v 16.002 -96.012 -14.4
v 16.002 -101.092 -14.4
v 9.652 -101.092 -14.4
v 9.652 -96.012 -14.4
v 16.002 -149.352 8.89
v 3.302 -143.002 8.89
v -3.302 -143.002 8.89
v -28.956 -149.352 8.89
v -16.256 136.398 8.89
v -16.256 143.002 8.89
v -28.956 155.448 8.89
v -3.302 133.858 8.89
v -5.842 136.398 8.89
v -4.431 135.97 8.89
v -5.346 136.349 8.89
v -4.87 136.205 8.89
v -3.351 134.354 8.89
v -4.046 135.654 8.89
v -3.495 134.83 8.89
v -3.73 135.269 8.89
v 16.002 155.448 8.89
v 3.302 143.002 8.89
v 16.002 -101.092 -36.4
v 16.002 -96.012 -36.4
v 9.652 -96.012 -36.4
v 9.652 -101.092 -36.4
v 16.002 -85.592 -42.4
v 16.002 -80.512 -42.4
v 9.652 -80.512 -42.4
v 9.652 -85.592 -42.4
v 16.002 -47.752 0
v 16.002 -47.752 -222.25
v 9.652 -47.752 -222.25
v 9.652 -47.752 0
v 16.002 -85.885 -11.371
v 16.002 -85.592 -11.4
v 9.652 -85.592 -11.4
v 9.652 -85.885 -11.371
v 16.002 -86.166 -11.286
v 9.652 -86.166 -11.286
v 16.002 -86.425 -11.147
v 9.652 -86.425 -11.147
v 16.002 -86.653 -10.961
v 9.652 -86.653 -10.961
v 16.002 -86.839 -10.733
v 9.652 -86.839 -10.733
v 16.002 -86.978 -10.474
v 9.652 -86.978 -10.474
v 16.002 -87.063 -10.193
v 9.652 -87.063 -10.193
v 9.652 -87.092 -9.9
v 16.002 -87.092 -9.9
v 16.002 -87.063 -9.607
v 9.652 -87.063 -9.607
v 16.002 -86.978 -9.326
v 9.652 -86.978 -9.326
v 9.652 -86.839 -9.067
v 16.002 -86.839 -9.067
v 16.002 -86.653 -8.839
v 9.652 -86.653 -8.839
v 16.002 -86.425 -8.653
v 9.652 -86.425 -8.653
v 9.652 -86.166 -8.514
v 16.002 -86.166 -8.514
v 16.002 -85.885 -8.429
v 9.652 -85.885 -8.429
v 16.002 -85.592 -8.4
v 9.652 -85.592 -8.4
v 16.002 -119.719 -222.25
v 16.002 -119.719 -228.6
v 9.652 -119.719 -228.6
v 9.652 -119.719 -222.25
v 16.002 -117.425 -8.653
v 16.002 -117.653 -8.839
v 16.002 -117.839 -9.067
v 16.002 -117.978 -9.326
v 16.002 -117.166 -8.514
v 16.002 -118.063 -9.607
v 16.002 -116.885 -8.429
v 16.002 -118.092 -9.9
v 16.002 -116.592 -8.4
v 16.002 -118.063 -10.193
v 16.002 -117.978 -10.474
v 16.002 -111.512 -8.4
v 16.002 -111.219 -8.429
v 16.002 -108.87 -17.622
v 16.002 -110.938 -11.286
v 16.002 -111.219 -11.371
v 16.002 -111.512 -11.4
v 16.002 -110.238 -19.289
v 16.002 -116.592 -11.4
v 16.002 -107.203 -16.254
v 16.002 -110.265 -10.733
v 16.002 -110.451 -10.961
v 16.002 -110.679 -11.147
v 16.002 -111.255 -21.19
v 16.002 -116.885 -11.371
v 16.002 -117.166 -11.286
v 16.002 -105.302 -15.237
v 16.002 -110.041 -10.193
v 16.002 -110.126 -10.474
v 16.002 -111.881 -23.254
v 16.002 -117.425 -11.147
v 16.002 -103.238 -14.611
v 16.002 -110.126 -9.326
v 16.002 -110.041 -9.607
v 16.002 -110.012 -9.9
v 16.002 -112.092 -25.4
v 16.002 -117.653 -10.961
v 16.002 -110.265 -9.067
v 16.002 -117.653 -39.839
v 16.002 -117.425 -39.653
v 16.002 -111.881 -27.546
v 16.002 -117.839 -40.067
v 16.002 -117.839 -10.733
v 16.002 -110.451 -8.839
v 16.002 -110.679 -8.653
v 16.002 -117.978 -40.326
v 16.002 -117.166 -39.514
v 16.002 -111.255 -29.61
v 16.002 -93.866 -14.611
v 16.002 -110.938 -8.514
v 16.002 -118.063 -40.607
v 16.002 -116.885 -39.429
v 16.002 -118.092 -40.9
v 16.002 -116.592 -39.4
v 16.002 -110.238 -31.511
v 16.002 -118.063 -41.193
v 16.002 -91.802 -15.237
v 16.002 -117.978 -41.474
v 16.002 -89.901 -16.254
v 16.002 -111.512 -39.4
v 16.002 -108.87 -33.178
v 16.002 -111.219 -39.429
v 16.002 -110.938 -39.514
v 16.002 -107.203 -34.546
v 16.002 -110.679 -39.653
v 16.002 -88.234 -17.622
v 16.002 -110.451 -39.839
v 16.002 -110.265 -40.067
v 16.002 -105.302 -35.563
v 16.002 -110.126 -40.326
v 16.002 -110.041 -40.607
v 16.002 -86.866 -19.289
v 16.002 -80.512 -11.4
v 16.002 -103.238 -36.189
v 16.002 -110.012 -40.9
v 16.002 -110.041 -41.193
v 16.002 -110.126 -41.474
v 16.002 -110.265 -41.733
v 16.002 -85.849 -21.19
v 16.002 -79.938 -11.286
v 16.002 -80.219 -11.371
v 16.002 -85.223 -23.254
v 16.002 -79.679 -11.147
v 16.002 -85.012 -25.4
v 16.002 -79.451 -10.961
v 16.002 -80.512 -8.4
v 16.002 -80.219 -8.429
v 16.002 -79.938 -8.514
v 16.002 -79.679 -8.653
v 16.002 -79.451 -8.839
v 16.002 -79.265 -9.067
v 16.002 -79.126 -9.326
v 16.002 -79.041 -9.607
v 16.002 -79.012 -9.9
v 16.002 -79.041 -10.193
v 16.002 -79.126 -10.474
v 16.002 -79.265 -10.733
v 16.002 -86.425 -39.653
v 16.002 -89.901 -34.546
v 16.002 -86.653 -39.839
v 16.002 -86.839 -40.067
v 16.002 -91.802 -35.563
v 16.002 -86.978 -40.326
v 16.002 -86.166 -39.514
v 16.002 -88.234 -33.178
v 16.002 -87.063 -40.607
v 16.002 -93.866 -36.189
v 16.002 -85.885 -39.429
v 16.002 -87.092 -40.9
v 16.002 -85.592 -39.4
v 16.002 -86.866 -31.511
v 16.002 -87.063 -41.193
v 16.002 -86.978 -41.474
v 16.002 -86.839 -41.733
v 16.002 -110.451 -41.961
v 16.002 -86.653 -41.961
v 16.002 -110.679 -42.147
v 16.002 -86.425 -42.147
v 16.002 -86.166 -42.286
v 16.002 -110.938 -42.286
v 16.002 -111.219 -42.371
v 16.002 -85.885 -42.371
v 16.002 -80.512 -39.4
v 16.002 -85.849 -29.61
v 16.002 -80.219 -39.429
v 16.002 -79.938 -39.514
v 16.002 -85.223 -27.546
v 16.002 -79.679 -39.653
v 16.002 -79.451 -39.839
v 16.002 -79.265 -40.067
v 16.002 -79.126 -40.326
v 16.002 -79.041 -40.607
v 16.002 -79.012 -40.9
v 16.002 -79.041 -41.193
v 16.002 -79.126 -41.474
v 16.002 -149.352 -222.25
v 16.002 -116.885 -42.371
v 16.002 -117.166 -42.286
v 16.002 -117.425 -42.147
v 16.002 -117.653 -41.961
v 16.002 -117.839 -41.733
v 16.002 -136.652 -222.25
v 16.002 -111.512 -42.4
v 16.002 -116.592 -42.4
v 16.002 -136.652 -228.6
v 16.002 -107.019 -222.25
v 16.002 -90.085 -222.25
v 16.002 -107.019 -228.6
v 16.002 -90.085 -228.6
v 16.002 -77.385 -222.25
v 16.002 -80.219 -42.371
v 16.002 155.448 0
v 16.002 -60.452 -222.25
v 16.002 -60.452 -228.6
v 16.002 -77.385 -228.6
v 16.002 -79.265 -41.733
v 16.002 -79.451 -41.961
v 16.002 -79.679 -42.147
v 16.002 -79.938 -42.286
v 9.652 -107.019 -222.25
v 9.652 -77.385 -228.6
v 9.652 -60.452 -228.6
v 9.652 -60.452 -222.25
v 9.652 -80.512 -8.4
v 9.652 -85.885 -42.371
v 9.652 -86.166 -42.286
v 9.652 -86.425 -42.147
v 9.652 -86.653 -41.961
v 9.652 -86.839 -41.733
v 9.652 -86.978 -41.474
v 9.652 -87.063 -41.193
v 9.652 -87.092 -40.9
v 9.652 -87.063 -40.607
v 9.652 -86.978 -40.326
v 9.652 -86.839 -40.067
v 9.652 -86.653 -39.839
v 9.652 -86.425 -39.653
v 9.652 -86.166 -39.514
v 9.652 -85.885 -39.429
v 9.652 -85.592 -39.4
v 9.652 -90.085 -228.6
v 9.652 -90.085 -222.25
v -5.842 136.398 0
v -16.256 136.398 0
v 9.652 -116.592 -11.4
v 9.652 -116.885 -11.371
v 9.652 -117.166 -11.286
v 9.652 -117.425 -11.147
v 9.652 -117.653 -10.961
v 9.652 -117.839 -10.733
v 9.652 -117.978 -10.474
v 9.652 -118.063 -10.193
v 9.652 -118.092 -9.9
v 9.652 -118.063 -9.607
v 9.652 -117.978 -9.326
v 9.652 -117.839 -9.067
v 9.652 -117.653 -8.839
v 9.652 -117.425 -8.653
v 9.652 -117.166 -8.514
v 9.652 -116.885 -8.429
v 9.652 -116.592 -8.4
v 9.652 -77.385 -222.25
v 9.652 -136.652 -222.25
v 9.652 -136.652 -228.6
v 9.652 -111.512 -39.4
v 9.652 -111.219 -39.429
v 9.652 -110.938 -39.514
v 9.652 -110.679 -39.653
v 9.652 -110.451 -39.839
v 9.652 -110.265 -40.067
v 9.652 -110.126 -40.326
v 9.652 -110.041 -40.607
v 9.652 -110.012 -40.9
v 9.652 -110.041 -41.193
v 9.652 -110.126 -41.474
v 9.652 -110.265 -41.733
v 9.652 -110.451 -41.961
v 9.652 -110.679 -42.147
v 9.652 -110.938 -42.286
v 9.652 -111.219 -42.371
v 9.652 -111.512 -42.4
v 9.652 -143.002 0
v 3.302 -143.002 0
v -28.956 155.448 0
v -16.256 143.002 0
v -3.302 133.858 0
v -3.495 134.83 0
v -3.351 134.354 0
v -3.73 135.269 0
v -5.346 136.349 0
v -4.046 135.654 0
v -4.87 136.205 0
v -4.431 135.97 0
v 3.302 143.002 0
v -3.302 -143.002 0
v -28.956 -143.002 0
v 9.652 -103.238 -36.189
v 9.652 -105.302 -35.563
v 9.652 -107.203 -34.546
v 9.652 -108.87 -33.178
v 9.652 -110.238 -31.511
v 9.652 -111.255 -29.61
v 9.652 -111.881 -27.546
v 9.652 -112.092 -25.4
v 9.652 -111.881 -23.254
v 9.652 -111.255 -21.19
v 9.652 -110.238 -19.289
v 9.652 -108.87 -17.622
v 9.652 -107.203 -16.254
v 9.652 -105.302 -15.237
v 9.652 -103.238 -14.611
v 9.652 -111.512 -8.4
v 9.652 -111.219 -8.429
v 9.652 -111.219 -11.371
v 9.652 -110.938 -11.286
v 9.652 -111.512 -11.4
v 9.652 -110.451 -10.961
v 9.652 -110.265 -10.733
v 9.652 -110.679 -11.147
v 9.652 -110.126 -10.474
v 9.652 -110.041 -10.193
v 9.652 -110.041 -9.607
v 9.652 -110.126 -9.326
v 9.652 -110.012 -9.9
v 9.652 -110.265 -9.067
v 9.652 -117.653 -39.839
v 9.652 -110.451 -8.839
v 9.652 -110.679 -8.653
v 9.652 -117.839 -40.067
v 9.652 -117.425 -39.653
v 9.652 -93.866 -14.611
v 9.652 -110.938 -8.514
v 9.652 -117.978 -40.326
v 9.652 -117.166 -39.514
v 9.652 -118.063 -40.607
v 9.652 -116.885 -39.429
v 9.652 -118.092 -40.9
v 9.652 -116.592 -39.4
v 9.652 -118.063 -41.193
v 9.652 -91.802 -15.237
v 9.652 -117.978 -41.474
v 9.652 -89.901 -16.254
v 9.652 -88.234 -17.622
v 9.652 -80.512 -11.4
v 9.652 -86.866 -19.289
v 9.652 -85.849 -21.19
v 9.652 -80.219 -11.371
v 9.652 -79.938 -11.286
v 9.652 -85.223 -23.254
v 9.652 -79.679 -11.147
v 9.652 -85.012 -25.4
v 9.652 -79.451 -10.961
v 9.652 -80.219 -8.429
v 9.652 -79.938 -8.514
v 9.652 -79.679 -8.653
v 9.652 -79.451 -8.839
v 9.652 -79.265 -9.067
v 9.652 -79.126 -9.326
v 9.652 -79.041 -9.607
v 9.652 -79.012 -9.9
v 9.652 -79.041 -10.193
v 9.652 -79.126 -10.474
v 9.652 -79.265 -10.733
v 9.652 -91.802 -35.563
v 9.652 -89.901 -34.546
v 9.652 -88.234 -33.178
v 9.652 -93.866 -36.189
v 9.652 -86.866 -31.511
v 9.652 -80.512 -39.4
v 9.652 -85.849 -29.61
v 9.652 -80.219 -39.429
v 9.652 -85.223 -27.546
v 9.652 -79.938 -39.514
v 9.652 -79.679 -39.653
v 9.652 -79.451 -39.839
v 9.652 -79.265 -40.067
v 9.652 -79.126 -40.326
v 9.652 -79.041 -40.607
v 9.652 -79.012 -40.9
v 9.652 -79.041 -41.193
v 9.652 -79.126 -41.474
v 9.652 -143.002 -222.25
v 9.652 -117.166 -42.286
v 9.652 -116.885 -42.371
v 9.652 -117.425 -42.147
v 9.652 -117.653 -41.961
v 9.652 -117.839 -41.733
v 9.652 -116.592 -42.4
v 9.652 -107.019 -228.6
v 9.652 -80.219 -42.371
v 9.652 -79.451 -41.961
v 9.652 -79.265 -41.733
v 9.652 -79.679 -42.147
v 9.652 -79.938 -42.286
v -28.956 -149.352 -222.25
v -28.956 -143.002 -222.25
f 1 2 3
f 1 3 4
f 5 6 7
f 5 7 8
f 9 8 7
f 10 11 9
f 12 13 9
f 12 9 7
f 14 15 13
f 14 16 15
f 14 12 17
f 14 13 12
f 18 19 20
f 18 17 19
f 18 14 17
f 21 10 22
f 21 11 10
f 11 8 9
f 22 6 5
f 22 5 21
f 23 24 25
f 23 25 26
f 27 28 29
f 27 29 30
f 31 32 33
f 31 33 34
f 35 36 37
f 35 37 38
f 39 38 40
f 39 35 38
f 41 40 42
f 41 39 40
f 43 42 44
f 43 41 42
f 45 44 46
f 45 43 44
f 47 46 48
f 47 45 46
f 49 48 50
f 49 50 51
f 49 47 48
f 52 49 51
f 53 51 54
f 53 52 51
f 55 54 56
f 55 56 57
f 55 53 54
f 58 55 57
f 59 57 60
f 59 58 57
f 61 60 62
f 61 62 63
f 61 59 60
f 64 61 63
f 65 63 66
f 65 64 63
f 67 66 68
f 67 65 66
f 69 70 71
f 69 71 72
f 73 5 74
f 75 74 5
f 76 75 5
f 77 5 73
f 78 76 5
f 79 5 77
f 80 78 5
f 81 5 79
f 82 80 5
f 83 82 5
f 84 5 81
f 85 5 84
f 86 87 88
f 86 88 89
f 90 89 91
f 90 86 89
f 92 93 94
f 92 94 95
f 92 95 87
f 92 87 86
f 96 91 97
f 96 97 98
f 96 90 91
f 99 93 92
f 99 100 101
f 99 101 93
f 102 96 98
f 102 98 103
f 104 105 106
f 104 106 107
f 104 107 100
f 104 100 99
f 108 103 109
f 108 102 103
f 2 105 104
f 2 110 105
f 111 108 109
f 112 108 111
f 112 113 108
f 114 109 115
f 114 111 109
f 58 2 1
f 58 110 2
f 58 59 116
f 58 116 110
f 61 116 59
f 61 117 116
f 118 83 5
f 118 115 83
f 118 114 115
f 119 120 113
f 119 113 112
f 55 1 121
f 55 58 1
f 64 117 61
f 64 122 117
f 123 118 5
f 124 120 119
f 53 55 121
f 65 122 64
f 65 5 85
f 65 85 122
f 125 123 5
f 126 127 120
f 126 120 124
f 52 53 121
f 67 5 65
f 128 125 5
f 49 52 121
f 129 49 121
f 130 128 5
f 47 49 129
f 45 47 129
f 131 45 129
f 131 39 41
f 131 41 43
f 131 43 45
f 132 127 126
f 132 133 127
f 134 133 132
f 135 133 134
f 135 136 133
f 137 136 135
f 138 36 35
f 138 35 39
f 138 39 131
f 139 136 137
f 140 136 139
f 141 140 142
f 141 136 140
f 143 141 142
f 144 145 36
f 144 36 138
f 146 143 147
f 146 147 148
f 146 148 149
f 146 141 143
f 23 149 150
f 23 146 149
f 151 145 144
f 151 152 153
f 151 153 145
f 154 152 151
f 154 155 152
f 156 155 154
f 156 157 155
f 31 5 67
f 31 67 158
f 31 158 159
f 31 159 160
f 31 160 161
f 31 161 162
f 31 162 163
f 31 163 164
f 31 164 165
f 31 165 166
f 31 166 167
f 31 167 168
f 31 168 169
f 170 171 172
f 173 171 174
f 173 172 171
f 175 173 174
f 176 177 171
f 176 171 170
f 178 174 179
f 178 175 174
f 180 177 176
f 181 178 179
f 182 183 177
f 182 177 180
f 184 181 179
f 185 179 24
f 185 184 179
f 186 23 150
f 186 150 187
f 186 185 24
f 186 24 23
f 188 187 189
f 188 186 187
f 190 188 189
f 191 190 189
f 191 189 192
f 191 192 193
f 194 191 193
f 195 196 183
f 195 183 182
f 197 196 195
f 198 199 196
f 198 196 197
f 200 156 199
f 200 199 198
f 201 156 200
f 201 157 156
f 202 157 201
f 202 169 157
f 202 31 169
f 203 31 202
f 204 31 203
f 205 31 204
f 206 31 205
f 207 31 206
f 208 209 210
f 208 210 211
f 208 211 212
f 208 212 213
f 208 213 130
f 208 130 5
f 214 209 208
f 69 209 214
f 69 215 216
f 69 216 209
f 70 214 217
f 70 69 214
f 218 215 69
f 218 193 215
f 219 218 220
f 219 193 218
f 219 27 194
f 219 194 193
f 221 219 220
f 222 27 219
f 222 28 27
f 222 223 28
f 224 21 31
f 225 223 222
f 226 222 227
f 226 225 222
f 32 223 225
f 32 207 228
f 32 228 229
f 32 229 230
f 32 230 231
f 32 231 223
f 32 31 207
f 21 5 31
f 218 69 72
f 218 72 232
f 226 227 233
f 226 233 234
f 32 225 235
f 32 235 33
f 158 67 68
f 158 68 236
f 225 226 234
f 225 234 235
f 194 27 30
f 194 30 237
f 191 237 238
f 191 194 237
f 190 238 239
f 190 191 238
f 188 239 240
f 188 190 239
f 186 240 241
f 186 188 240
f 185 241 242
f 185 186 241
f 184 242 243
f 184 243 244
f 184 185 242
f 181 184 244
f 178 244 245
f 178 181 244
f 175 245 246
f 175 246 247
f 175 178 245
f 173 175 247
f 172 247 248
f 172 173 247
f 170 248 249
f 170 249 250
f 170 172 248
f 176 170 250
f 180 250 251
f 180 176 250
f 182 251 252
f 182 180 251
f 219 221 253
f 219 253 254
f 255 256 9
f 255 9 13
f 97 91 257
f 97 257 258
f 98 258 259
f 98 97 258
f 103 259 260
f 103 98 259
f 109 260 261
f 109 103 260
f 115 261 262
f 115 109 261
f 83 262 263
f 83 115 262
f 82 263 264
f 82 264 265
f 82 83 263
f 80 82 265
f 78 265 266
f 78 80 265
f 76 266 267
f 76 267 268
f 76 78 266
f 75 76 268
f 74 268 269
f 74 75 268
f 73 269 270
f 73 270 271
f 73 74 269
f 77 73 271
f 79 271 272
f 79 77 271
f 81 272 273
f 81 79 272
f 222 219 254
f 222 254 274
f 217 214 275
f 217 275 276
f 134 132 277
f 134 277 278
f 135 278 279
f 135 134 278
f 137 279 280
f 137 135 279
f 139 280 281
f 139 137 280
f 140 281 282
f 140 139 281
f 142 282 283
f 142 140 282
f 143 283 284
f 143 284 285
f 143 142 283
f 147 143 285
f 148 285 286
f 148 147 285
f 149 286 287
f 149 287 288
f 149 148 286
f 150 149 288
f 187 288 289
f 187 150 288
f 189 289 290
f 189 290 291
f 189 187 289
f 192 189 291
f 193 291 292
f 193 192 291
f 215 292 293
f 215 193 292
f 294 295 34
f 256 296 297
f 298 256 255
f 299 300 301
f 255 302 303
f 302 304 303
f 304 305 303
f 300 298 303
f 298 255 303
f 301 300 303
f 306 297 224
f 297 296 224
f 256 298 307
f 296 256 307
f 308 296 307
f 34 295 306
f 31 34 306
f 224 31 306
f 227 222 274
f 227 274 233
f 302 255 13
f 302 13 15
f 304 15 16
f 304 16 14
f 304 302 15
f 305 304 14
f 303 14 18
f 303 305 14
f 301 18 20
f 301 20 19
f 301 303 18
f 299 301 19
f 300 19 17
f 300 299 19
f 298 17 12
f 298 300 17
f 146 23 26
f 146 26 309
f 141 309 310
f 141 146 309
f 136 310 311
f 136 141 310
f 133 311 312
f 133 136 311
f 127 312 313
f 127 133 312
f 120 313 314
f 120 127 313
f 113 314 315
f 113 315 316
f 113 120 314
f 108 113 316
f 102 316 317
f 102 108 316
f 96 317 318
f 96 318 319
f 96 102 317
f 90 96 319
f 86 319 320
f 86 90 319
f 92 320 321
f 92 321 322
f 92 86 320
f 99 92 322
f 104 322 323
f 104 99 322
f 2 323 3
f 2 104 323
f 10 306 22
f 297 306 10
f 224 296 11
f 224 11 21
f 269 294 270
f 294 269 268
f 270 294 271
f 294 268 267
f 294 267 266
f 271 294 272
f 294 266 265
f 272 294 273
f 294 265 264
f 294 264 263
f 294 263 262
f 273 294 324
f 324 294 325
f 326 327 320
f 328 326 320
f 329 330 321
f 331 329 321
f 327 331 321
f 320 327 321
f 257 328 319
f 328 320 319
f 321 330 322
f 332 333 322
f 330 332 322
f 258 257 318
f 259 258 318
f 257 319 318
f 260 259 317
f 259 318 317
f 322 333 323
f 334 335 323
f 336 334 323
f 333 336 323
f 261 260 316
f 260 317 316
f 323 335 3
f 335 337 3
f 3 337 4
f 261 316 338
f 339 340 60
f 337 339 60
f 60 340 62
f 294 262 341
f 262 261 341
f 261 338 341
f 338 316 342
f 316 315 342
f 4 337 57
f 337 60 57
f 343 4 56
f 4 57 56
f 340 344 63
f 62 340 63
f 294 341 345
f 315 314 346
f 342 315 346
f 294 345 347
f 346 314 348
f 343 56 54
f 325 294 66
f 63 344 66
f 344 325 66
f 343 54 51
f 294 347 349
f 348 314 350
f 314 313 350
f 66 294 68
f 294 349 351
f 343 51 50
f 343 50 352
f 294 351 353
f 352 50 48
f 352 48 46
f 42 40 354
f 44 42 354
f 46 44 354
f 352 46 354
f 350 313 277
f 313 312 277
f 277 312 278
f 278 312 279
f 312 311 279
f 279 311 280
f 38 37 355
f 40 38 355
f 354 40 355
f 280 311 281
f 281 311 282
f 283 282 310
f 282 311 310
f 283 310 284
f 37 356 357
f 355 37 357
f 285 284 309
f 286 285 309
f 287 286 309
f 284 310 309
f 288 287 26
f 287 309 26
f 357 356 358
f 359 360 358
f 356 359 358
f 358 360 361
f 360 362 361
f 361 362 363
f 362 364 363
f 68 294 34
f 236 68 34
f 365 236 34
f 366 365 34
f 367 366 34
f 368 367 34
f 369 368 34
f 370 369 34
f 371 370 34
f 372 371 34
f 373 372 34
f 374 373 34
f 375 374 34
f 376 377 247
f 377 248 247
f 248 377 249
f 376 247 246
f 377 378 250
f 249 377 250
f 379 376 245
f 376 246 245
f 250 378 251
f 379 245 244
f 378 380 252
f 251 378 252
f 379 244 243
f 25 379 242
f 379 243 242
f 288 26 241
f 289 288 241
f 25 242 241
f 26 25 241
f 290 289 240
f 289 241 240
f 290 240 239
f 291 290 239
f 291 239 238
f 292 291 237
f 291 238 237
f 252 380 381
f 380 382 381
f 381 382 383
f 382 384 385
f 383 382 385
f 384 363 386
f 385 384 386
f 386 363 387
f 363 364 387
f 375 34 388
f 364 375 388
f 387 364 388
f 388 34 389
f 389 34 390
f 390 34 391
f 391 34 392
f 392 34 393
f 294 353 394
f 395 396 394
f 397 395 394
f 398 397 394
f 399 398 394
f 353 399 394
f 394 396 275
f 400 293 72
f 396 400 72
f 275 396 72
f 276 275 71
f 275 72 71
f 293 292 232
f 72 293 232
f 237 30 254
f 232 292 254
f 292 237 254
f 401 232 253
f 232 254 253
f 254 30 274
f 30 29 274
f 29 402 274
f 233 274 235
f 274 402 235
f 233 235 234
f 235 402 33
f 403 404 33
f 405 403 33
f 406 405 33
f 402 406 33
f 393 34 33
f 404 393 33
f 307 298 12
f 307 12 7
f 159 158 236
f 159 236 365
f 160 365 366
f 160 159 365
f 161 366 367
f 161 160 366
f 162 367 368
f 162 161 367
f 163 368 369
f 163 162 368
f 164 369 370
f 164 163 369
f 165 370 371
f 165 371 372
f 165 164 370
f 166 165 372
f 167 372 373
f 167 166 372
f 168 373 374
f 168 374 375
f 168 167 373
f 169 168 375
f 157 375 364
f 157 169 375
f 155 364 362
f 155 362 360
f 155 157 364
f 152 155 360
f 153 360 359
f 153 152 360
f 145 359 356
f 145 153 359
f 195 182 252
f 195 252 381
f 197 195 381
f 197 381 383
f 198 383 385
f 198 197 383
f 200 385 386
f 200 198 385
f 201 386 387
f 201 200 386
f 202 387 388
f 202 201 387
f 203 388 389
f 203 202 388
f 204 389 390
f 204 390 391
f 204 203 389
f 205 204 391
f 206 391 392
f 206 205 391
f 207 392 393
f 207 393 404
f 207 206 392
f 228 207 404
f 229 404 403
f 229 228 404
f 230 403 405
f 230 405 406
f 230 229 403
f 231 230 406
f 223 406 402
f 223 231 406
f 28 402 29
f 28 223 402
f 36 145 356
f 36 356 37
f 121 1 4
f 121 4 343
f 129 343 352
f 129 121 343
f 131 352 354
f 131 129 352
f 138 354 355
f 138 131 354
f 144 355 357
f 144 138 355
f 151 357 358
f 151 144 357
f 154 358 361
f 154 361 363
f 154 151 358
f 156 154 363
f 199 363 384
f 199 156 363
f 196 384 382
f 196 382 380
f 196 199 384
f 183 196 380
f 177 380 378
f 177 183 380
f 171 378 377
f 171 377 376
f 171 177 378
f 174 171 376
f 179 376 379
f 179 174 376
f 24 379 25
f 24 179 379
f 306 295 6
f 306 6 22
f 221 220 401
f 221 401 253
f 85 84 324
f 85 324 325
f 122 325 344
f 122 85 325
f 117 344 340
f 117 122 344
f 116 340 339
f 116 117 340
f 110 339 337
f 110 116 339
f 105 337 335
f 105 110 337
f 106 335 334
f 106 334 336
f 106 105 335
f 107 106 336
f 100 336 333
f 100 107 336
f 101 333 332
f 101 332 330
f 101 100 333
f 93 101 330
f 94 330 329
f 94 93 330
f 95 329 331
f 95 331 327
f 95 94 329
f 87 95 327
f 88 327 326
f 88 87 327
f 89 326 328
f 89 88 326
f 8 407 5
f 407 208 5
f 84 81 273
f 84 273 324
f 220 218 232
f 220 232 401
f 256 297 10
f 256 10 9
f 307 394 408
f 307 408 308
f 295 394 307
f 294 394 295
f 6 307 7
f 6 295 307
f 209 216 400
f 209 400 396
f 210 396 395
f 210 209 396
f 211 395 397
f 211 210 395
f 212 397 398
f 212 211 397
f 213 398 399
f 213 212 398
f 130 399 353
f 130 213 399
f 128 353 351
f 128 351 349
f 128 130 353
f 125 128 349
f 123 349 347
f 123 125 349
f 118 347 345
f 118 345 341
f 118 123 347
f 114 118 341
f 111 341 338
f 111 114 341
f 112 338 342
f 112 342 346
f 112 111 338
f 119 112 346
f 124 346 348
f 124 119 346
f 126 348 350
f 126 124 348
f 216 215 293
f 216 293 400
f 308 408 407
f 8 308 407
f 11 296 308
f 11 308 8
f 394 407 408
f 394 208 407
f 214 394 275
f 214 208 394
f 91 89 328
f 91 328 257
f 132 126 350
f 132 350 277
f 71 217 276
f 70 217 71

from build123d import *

# Parameters (mm, degrees)
SKETCH1_W           = 44.958
SKETCH1_H           = 304.8
BOSS_EXTRUDE1_DEPTH = 8.89
SKETCH2_W           = 8.89
SKETCH2_H           = 101.6
BOSS_EXTRUDE2_DEPTH = 6.35
SKETCH3_W           = 222.25
SKETCH3_H           = 6.35
BOSS_EXTRUDE3_DEPTH = 38.608


with BuildPart() as part:
    # Sketch1 → Boss-Extrude1 (new body)
    with BuildSketch(Plane.XY):
        with Locations((-6.477, 3.048)):
            Rectangle(SKETCH1_W, SKETCH1_H)
        with BuildLine():
            Line((-3.302, 133.858), (-3.302, -143.002))
            Line((-3.302, -143.002), (3.302, -143.002))
            Line((3.302, -143.002), (3.302, 143.002))
            Line((3.302, 143.002), (-16.256, 143.002))
            Line((-16.256, 143.002), (-16.256, 136.398))
            Line((-16.256, 136.398), (-5.842, 136.398))
            ThreePointArc((-5.842, 136.398), (-4.045948776, 135.654051224), (-3.302, 133.858))
        make_face(mode=Mode.SUBTRACT)
    extrude(amount=BOSS_EXTRUDE1_DEPTH)

    # Sketch2 → Boss-Extrude2 (add)
    with BuildSketch(Plane(origin=(16.002, 0, 0), x_dir=(0, 0, -1), z_dir=(1, 0, 0))):
        Polygon((222.25, -60.452), (222.25, -47.752), (0, -47.752), (0, -149.352), (222.25, -149.352), (222.25, -136.652), (228.6, -136.652), (228.6, -119.718666667), (222.25, -119.718666667), (222.25, -107.018666667), (228.6, -107.018666667), (228.6, -90.085333333), (222.25, -90.085333333), (222.25, -77.385333333), (228.6, -77.385333333), (228.6, -60.452), align=None)
        with BuildLine():
            ThreePointArc((11.4, -116.592), (9.9, -118.092), (8.4, -116.592))
            Line((8.4, -116.592), (8.4, -111.512))
            ThreePointArc((8.4, -111.512), (9.9, -110.012), (11.4, -111.512))
            Line((11.4, -111.512), (11.4, -116.592))
        make_face(mode=Mode.SUBTRACT)
        with BuildLine():
            Line((42.4, -111.512), (42.4, -116.592))
            ThreePointArc((42.4, -116.592), (40.9, -118.092), (39.4, -116.592))
            Line((39.4, -116.592), (39.4, -111.512))
            ThreePointArc((39.4, -111.512), (40.9, -110.012), (42.4, -111.512))
        make_face(mode=Mode.SUBTRACT)
        with BuildLine():
            ThreePointArc((36.4, -101.092), (25.4, -112.092), (14.4, -101.092))
            Line((14.4, -101.092), (14.4, -96.012))
            ThreePointArc((14.4, -96.012), (25.4, -85.012), (36.4, -96.012))
            Line((36.4, -96.012), (36.4, -101.092))
        make_face(mode=Mode.SUBTRACT)
        with BuildLine():
            ThreePointArc((11.4, -85.592), (9.9, -87.092), (8.4, -85.592))
            Line((8.4, -85.592), (8.4, -80.512))
            ThreePointArc((8.4, -80.512), (9.9, -79.012), (11.4, -80.512))
            Line((11.4, -80.512), (11.4, -85.592))
        make_face(mode=Mode.SUBTRACT)
        with BuildLine():
            ThreePointArc((42.4, -85.592), (40.9, -87.092), (39.4, -85.592))
            Line((39.4, -85.592), (39.4, -80.512))
            ThreePointArc((39.4, -80.512), (40.9, -79.012), (42.4, -80.512))
            Line((42.4, -80.512), (42.4, -85.592))
        make_face(mode=Mode.SUBTRACT)
        with Locations((-4.445, -98.552)):
            Rectangle(SKETCH2_W, SKETCH2_H)
    extrude(amount=-BOSS_EXTRUDE2_DEPTH)

    # Sketch3 → Boss-Extrude3 (add)
    with BuildSketch(Plane.ZY.offset(-9.652)):
        with Locations((-111.125, -146.177)):
            Rectangle(SKETCH3_W, SKETCH3_H)
    extrude(amount=BOSS_EXTRUDE3_DEPTH)


solid = part.part
